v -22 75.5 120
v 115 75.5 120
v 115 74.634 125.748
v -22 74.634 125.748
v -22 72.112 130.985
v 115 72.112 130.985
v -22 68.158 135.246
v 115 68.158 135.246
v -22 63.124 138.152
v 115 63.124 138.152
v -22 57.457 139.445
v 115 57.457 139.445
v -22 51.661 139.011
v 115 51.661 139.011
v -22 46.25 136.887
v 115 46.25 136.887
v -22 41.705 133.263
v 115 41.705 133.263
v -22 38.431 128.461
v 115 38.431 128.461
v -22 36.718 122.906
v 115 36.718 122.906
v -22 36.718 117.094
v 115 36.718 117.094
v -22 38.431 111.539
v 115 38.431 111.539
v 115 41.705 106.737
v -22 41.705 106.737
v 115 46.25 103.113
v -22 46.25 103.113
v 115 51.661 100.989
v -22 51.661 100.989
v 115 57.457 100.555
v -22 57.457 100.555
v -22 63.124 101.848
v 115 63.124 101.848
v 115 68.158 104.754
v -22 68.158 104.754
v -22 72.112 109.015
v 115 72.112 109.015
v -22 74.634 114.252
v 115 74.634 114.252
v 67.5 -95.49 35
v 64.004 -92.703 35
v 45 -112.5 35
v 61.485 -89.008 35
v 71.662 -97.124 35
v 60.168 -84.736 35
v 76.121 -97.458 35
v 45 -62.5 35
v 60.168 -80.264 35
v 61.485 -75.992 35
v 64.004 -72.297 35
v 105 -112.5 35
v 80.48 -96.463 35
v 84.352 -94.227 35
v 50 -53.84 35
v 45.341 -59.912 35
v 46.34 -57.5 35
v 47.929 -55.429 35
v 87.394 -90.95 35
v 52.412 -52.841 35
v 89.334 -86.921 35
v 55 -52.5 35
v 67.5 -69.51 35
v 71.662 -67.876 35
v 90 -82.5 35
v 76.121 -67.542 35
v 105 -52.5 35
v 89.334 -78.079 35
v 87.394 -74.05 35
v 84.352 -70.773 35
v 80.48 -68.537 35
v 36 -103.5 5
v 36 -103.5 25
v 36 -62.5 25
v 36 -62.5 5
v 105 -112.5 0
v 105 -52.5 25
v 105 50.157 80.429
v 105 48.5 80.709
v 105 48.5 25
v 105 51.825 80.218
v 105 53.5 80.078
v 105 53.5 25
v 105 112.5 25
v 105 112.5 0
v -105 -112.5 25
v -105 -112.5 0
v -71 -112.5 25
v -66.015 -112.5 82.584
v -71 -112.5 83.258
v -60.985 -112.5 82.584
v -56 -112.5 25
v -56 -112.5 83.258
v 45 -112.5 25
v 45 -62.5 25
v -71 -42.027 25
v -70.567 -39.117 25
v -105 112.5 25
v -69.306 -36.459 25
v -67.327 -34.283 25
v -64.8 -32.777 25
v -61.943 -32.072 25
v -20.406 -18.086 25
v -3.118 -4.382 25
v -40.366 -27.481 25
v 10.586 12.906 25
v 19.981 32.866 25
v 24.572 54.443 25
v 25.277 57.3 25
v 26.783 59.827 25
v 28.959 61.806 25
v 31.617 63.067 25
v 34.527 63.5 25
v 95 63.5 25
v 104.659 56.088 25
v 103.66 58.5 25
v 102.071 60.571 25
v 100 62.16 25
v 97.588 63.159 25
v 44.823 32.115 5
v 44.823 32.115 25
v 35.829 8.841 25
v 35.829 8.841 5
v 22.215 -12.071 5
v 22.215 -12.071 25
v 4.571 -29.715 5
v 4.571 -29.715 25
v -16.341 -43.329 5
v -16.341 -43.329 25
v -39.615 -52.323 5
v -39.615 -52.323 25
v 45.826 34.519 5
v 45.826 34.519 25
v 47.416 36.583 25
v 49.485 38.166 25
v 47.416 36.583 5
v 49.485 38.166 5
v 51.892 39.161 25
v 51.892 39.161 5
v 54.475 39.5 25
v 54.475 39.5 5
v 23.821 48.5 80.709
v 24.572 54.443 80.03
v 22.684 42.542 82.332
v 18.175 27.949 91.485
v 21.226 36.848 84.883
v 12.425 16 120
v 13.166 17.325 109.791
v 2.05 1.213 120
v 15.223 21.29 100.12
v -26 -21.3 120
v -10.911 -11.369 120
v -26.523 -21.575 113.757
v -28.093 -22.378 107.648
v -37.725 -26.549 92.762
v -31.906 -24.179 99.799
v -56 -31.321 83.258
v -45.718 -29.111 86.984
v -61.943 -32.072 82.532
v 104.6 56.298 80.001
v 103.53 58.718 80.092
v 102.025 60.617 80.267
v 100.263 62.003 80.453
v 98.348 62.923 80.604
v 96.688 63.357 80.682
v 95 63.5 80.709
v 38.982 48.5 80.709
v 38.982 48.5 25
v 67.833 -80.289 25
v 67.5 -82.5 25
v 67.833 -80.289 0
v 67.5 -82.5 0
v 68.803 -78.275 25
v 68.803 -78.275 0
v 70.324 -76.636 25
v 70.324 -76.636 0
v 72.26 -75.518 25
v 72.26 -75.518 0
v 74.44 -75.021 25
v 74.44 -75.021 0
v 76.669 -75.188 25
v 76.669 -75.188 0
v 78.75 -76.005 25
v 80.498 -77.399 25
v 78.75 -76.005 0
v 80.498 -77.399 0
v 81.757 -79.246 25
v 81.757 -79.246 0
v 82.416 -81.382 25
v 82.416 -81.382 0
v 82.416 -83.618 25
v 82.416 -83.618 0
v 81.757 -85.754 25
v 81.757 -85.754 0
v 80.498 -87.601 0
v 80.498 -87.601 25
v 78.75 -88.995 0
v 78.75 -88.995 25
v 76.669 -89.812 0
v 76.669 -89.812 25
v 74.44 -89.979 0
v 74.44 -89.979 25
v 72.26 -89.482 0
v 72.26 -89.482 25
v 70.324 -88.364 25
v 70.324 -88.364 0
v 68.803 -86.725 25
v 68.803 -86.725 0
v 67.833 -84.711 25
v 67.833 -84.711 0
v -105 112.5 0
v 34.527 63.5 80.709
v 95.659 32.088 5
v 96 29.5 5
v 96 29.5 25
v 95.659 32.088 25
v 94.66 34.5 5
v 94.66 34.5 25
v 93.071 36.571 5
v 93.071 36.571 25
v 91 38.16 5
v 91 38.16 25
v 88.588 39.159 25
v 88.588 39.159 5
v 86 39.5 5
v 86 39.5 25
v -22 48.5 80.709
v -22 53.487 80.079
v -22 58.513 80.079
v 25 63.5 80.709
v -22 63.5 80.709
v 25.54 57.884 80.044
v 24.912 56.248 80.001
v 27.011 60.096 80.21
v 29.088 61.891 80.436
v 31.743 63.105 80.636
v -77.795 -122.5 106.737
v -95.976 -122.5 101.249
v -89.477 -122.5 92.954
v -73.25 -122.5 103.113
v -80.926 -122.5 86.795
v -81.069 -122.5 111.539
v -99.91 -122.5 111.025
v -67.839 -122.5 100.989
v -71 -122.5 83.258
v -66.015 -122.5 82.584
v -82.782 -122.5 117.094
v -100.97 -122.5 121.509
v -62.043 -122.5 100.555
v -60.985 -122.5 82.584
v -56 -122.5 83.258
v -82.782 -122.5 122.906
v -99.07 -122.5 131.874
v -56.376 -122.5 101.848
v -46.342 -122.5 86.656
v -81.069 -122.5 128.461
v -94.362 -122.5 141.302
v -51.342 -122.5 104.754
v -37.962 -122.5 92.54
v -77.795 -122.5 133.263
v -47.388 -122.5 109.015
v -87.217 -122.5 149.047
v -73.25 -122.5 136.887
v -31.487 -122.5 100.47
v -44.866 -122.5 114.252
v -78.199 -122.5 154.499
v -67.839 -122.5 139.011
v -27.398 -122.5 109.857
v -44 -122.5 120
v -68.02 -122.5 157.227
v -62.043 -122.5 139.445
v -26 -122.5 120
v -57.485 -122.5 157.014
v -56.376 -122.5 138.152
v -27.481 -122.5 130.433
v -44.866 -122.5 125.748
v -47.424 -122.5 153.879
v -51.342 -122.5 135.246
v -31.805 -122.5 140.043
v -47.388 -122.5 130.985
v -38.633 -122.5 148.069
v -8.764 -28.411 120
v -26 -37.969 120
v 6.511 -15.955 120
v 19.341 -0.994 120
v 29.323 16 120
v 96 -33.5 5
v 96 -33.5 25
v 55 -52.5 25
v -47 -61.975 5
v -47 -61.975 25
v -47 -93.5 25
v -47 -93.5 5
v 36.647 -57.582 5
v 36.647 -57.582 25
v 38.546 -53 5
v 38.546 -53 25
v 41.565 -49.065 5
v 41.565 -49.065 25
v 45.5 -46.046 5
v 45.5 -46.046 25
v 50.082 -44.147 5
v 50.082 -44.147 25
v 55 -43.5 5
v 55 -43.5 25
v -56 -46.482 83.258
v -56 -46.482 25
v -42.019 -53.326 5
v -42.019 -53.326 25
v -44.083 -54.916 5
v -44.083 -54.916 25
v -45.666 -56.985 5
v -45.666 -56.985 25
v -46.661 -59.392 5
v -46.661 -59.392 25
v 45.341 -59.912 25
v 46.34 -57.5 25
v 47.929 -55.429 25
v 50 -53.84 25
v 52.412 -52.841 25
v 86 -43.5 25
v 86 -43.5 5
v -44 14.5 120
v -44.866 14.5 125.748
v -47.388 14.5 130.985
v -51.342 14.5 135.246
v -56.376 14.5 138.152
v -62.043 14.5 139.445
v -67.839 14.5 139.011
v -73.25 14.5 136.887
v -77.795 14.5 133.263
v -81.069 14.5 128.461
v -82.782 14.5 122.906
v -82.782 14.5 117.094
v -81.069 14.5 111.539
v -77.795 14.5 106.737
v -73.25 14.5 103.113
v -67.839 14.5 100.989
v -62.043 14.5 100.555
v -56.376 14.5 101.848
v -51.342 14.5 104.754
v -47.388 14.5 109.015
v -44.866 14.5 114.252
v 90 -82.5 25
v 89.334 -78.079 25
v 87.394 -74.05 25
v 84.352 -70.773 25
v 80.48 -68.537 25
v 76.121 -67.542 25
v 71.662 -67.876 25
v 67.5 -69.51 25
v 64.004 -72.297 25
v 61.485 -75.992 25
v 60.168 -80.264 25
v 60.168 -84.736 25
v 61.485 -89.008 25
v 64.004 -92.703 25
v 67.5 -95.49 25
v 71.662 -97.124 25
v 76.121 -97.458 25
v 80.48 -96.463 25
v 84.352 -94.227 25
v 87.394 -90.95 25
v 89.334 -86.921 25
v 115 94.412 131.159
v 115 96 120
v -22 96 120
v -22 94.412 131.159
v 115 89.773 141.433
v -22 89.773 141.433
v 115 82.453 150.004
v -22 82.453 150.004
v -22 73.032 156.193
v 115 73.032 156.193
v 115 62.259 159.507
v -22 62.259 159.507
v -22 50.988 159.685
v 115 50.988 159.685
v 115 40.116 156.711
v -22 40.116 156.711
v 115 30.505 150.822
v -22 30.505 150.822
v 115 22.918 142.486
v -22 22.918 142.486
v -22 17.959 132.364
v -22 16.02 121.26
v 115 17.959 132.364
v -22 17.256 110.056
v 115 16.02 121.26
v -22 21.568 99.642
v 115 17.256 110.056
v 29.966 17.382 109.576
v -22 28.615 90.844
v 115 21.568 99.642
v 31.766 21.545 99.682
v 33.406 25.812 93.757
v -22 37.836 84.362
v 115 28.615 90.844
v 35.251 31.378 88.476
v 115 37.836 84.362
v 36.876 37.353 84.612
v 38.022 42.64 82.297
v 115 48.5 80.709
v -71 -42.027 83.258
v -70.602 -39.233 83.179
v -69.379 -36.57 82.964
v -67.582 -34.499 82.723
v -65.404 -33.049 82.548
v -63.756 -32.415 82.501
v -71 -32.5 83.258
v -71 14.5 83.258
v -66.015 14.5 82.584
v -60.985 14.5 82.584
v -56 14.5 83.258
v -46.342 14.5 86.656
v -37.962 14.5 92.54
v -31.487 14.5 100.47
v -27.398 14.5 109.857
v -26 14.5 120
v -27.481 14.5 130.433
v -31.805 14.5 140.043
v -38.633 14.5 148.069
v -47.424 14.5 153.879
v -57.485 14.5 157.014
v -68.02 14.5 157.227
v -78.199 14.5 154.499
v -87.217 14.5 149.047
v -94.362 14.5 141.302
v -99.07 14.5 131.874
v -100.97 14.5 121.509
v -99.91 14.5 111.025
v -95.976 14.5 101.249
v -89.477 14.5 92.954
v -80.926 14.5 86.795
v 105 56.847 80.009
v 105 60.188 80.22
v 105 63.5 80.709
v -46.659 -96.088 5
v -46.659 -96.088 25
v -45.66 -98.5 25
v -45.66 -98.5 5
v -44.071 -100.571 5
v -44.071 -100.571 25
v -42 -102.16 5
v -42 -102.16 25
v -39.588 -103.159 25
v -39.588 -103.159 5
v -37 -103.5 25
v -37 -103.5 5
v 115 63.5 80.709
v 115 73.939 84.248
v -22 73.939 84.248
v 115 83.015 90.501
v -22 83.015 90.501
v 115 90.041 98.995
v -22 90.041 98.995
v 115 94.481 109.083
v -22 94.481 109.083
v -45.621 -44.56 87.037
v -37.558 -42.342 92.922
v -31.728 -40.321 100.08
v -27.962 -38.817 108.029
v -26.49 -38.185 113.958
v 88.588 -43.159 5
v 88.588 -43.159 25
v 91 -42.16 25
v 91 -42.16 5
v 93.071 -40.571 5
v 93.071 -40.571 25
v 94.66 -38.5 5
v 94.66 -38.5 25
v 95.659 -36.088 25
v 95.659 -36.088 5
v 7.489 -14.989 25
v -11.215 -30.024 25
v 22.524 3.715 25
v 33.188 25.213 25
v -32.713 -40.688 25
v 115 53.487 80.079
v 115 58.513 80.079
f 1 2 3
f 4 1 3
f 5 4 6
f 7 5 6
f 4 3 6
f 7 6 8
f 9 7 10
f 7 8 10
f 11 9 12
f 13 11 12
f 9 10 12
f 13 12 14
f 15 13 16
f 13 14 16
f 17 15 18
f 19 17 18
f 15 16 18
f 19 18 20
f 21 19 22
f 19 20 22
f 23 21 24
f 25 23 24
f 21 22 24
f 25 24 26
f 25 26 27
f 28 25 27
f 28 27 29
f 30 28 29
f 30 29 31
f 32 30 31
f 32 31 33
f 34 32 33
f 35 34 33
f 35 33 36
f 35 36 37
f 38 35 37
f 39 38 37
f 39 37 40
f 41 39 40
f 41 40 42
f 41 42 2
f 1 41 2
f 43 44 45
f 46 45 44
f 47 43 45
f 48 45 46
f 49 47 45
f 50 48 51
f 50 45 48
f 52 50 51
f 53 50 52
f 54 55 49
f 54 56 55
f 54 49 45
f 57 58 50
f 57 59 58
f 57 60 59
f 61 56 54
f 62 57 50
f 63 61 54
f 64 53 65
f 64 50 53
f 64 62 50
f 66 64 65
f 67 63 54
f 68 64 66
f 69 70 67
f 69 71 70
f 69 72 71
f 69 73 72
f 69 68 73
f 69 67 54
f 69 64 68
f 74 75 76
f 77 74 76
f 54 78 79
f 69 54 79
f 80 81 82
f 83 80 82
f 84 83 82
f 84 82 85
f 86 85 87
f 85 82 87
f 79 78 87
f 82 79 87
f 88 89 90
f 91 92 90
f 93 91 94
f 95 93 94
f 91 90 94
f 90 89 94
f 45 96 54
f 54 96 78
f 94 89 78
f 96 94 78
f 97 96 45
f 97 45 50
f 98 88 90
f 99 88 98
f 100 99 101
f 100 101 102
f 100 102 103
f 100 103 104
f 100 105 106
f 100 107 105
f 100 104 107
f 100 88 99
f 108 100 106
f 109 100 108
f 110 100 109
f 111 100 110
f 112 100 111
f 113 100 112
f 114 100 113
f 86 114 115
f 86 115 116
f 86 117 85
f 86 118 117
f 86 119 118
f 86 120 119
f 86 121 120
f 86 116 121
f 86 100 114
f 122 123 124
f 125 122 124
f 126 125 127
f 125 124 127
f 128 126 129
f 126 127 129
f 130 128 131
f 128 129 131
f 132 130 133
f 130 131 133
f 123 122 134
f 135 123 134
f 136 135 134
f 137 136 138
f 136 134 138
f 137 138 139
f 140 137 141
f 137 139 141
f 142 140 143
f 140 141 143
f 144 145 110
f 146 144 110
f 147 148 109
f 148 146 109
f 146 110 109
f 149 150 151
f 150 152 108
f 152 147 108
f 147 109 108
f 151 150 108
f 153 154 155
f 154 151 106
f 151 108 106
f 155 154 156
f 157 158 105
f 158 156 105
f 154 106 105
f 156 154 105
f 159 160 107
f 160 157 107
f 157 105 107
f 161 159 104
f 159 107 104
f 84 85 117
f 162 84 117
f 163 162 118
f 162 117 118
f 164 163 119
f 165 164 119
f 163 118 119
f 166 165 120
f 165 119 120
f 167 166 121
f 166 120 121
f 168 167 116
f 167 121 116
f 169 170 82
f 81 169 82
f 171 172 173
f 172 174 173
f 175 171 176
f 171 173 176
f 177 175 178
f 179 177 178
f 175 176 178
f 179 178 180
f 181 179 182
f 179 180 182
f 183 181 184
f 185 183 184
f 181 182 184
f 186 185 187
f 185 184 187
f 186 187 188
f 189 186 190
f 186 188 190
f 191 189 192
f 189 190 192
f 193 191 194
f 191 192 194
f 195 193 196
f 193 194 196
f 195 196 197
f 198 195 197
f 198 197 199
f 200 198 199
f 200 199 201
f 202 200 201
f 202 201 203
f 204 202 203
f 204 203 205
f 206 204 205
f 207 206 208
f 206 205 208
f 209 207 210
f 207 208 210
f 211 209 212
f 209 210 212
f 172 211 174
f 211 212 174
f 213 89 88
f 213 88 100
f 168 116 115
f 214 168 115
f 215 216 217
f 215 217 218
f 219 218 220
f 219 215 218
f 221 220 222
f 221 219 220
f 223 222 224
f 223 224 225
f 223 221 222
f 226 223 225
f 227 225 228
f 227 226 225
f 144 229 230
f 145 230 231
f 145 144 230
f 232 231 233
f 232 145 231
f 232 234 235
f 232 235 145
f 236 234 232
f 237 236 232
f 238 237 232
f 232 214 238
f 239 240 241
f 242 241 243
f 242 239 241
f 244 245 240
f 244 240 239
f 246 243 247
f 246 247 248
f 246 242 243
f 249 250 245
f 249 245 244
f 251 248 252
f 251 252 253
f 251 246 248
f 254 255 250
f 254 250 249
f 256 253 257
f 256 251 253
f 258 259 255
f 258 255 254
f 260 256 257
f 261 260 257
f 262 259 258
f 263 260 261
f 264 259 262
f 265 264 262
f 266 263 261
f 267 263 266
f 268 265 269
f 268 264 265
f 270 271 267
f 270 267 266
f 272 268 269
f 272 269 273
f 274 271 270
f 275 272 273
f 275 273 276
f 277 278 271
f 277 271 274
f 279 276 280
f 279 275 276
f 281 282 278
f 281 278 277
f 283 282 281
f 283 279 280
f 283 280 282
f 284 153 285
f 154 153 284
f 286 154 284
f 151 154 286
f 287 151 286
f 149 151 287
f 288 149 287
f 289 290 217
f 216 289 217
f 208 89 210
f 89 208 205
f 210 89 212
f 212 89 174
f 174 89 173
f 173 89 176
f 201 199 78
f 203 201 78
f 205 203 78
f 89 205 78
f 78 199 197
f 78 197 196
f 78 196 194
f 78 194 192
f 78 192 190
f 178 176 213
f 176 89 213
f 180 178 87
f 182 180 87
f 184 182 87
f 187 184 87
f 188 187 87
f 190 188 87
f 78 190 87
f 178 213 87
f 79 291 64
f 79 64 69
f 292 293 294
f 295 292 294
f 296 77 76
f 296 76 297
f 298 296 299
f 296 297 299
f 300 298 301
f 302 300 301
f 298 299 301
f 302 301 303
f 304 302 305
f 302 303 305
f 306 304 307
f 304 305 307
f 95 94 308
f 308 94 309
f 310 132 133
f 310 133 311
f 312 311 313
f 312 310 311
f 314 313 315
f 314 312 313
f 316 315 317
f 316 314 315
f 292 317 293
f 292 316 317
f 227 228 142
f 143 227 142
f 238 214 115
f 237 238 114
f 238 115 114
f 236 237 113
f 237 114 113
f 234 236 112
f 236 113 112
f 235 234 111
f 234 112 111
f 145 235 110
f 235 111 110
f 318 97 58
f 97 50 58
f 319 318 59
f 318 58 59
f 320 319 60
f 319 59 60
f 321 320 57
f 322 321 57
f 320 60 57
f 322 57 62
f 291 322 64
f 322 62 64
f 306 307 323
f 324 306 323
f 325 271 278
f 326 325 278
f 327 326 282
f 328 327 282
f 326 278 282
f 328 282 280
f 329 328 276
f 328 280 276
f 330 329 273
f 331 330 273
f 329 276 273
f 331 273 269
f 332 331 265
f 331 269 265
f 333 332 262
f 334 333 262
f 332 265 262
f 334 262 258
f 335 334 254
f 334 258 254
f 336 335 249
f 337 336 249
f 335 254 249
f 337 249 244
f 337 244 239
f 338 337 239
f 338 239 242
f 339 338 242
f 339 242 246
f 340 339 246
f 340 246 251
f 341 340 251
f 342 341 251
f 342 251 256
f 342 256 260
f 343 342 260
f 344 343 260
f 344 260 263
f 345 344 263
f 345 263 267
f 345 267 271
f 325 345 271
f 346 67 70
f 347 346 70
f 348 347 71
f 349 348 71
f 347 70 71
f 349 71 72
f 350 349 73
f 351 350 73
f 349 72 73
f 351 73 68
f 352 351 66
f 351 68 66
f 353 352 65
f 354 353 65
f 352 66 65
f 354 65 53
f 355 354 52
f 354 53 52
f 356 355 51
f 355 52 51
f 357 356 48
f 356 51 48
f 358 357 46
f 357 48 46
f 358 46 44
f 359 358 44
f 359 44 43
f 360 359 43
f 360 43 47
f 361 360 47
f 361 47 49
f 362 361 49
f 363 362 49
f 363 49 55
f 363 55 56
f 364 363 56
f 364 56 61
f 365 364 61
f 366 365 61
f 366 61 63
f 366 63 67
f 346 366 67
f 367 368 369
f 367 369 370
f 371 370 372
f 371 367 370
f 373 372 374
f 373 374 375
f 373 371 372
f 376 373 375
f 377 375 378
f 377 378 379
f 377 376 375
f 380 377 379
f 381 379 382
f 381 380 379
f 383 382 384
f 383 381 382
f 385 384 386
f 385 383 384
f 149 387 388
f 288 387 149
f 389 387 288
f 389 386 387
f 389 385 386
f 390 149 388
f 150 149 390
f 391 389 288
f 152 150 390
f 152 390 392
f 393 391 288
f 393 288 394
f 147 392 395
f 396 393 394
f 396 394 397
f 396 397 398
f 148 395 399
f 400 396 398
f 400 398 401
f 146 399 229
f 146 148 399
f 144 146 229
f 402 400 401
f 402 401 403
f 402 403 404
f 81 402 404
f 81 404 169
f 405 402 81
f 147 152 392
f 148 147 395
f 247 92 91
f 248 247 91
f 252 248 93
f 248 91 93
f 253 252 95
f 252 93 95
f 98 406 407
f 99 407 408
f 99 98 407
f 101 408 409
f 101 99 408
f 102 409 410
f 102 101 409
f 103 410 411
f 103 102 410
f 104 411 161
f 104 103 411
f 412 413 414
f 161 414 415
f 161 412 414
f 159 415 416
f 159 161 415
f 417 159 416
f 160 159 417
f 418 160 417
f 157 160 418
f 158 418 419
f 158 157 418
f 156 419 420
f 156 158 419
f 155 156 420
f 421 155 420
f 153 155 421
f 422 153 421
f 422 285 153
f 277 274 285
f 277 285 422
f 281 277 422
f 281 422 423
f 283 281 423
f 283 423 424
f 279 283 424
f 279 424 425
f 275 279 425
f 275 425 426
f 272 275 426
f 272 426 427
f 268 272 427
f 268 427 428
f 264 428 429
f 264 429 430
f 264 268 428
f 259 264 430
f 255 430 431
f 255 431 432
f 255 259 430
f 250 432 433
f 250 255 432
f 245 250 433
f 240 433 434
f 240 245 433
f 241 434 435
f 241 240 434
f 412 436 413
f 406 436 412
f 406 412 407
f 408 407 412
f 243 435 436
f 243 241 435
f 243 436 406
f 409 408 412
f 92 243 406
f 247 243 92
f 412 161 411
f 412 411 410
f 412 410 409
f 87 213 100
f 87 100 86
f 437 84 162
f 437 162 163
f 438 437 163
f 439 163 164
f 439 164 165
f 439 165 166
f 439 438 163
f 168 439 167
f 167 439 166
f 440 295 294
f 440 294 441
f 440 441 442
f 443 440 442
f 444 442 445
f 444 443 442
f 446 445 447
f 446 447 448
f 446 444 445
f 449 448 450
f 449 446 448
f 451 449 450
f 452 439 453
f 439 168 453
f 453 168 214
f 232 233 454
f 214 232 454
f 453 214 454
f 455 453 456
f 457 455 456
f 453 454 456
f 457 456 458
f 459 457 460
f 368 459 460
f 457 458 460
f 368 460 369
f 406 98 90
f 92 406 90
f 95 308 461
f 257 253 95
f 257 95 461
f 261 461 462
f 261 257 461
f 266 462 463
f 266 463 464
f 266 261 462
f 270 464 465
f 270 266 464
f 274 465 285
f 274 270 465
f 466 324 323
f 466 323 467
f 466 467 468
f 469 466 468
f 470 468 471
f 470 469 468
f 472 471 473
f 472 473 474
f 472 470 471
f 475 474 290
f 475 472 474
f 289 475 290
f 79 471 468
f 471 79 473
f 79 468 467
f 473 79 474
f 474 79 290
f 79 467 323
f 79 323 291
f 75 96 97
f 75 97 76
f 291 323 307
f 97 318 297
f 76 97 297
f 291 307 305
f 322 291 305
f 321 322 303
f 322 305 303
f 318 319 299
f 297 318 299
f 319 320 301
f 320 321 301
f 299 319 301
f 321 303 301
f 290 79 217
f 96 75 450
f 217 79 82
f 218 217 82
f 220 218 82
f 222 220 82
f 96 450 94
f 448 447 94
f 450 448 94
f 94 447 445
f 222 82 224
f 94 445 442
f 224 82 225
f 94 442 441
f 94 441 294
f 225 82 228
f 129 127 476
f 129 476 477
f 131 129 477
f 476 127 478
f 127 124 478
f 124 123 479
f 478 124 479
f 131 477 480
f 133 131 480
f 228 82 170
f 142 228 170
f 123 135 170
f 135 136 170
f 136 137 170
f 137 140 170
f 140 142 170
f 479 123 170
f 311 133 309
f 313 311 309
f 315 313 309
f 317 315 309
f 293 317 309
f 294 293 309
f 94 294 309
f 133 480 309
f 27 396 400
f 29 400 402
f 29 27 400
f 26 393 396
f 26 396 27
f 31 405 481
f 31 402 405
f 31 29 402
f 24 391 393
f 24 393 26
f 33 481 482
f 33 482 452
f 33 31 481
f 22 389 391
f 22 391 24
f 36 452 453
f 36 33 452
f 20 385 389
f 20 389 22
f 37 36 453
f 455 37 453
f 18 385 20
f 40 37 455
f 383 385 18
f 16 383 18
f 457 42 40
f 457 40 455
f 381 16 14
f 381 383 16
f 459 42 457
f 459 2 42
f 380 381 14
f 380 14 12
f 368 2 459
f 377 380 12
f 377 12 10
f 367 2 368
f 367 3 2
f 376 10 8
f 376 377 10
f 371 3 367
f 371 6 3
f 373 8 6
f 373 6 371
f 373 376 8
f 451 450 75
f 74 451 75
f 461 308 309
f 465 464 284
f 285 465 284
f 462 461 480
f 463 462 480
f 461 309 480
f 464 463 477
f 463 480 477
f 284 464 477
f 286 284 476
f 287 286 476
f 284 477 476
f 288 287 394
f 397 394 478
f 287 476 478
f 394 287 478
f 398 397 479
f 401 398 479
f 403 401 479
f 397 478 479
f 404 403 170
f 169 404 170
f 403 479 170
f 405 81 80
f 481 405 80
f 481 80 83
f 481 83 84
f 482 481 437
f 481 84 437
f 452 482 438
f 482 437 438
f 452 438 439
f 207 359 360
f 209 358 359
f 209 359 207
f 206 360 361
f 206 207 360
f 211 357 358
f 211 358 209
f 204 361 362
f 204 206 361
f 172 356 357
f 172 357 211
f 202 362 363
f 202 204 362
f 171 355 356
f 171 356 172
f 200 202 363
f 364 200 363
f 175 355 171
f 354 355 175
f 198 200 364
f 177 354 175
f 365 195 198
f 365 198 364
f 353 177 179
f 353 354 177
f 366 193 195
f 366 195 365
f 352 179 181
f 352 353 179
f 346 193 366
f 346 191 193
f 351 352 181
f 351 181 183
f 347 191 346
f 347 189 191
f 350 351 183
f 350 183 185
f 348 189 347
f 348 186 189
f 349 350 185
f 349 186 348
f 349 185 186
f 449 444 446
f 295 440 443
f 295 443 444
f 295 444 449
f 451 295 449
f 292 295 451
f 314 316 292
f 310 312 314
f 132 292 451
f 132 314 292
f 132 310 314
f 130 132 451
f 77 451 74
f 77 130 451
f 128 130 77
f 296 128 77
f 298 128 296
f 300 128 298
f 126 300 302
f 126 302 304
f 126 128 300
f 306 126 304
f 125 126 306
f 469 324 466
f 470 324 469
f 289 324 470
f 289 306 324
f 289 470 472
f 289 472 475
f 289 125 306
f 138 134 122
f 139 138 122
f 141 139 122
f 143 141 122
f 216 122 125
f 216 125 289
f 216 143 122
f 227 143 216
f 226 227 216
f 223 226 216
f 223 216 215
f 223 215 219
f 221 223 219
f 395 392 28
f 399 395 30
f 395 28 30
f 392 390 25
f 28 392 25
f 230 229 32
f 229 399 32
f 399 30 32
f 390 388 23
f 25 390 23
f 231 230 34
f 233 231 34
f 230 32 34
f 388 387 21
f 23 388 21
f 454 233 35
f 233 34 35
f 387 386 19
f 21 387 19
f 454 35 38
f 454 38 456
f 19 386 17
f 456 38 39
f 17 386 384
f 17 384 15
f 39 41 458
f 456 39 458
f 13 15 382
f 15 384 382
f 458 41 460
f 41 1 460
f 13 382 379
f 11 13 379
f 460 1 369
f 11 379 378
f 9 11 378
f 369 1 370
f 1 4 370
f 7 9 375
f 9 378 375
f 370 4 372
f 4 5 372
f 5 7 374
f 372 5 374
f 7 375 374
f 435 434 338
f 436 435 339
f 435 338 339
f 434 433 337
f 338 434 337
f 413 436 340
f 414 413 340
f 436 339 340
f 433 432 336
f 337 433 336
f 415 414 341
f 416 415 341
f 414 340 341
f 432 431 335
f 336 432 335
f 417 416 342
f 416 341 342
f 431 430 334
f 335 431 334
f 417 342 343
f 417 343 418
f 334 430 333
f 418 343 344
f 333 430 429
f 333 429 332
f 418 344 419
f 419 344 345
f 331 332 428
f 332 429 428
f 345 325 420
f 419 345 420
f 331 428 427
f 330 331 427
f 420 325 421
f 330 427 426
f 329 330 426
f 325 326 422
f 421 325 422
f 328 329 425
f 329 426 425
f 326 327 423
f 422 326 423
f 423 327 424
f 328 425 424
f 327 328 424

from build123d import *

# Parameters (mm, degrees)
F0_W            = 210
F0_H            = 225
F1_DEPTH        = 25
F3_DEPTH        = 95
F5_DEPTH        = 10
F5_DEPTH_BACK   = 127
F7_DEPTH        = 10
F7_DEPTH_BACK   = 127
F8_W            = 60
F8_H            = 60
F9_DEPTH        = 10
F10_R           = 10
F12_DEPTH       = 20
F14_D           = 15
F14_CBORE_D     = 30
F14_CBORE_DEPTH = 10
F15_T1_DEPTH    = 20
F15_T6_DEPTH    = 80.7094158862
F15_S7_R        = 40
F15_T8_DEPTH    = 42
F15_T12_DEPTH   = 79.5275350517
F15_S13_R       = 40
F15_T14_DEPTH   = 42
F15_T18_DEPTH   = 82.0757730237
F15_S19_R       = 37.5
F15_T20_DEPTH   = 43
F16_R           = 19.5
F17_DEPTH       = 235.001
F18_R           = 19.5
F19_DEPTH       = 220.001


# Not quite as in the source:
# - a fillet or chamfer that OpenCascade refuses, or shapes differently, is made with other operations: its cross-section is extruded or revolved along the edge and cut away or added


with BuildPart() as f1:
    # F0 (on Top) → F1 (new body)
    with BuildSketch(Plane.XY):
        Rectangle(F0_W, F0_H)
    extrude(amount=F1_DEPTH)

    # F2 (on face) → F3 (join)
    with BuildSketch(Plane.XY.offset(25)):
        with BuildLine():
            Line((105, 48.5), (105, 63.5))
            Line((105, 63.5), (25, 63.5))
            ThreePointArc((25, 63.5), (-3.1177490061, -4.3822509939), (-71, -32.5))
            Line((-71, -32.5), (-71, -112.5))
            Line((-71, -112.5), (-56, -112.5))
            Line((-56, -112.5), (-56, -46.4818166789))
            ThreePointArc((-56, -46.4818166789), (7.4888527117, -14.9888527117), (38.9818166789, 48.5))
            Line((38.9818166789, 48.5), (105, 48.5))
        make_face()
    extrude(amount=F3_DEPTH)

    # F4 (on face) → F5 (join, two sides)
    with BuildSketch(Plane.XZ.offset(112.5)) as f5_sk:
        with BuildLine():
            ThreePointArc((-56, 83.2576538583), (-34.4526249034, 96.2829175487), (-26, 120))
            ThreePointArc((-26, 120), (-87.2170824513, 149.0473750966), (-71, 83.2576538583))
            Line((-71, 83.2576538583), (-71, 120))
            Line((-71, 120), (-56, 120))
            Line((-56, 120), (-56, 83.2576538583))
        make_face()
        with BuildLine():
            Line((-71, 120), (-71, 83.2576538583))
            ThreePointArc((-71, 83.2576538583), (-63.5, 82.5), (-56, 83.2576538583))
            Line((-56, 83.2576538583), (-56, 120))
            Line((-56, 120), (-71, 120))
        make_face()
    extrude(amount=F5_DEPTH)
    extrude(f5_sk.sketch, amount=-F5_DEPTH_BACK)

    # F6 (on face) → F7 (join, two sides)
    with BuildSketch(Plane.YZ.offset(105)) as f7_sk:
        with BuildLine():
            Line((48.5, 120), (48.5, 80.7094158862))
            ThreePointArc((48.5, 80.7094158862), (56, 80), (63.5, 80.7094158862))
            Line((63.5, 80.7094158862), (63.5, 120))
            Line((63.5, 120), (48.5, 120))
        make_face()
        with BuildLine():
            ThreePointArc((63.5, 80.7094158862), (86.8220700148, 94.504902432), (96, 120))
            ThreePointArc((96, 120), (30.504902432, 150.8220700148), (48.5, 80.7094158862))
            Line((48.5, 80.7094158862), (48.5, 120))
            Line((48.5, 120), (63.5, 120))
            Line((63.5, 120), (63.5, 80.7094158862))
        make_face()
    extrude(amount=F7_DEPTH)
    extrude(f7_sk.sketch, amount=-F7_DEPTH_BACK)

    # F8 (on face) → F9 (join)
    with BuildSketch(Plane.XY.offset(25)):
        with Locations((75, -82.5)):
            Rectangle(F8_W, F8_H)
    extrude(amount=F9_DEPTH)

    # F10
    f10_edges = [f1.edges().sort_by_distance(p)[0] for p in [
        (45, -52.5, 30),
    ]]
    fillet(f10_edges, radius=F10_R)

    # F11 (on face) → F12 (cut)
    with BuildSketch(Plane.XY.offset(25)):
        with BuildLine():
            ThreePointArc((46.5755076536, 39.5), (13.8528137424, -21.3528137424), (-47, -54.0755076536))
            Line((-47, -54.0755076536), (-47, -103.5))
            Line((-47, -103.5), (36, -103.5))
            Line((36, -103.5), (36, -62.5))
            ThreePointArc((36, -62.5), (41.5649711575, -49.0649711575), (55, -43.5))
            Line((55, -43.5), (96, -43.5))
            Line((96, -43.5), (96, 39.5))
            Line((96, 39.5), (46.5755076536, 39.5))
        make_face()
    extrude(amount=-F12_DEPTH, mode=Mode.SUBTRACT)

    # F14 (through all)
    with Locations(Plane.XY.offset(35)):
        with Locations((75, -82.5)):
            CounterBoreHole(F14_D / 2, F14_CBORE_D / 2, F14_CBORE_DEPTH)

    # F15: fillet of radius 10 on 8 edges, made by hand

    # F15_s2 → F15_t1 (join)
    with BuildSketch(Plane.XY.offset(5)):
        with BuildLine():
            ThreePointArc((-39.6153846154, -52.3231665823), (-44.9420981533, -55.8986609284), (-47, -61.9750971309))
            Line((-47, -61.9750971309), (-47, -54.0755076536))
            ThreePointArc((-47, -54.0755076536), (-43.2938349797, -53.257733876), (-39.6153846154, -52.3231665823))
        make_face()
        with BuildLine():
            ThreePointArc((44.8231665823, 32.1153846154), (48.3986609284, 37.4420981533), (54.4750971309, 39.5))
            Line((54.4750971309, 39.5), (46.5755076536, 39.5))
            ThreePointArc((46.5755076536, 39.5), (45.757733876, 35.7938349797), (44.8231665823, 32.1153846154))
        make_face()
        with BuildLine():
            ThreePointArc((96, 29.5), (93.0710678119, 36.5710678119), (86, 39.5))
            Line((86, 39.5), (96, 39.5))
            Line((96, 39.5), (96, 29.5))
        make_face()
        with BuildLine():
            ThreePointArc((86, -43.5), (93.0710678119, -40.5710678119), (96, -33.5))
            Line((96, -33.5), (96, -43.5))
            Line((96, -43.5), (86, -43.5))
        make_face()
        with BuildLine():
            ThreePointArc((-47, -93.5), (-44.0710678119, -100.5710678119), (-37, -103.5))
            Line((-37, -103.5), (-47, -103.5))
            Line((-47, -103.5), (-47, -93.5))
        make_face()
    extrude(amount=F15_T1_DEPTH)


with BuildPart() as f15_tool4:
    # F15_s5 → F15_t6 (new body)
    with BuildSketch(Plane.XY.offset(25)):
        with BuildLine():
            ThreePointArc((105, 53.5), (102.0710678119, 60.5710678119), (95, 63.5))
            Line((95, 63.5), (105, 63.5))
            Line((105, 63.5), (105, 53.5))
        make_face()
    extrude(amount=F15_T6_DEPTH)

    # F15_s7 → F15_t8 (cut, symmetric)
    with BuildSketch(Plane.YZ.offset(100)):
        with Locations((56, 120)):
            Circle(F15_S7_R)
    extrude(amount=F15_T8_DEPTH, both=True, mode=Mode.SUBTRACT)


with BuildPart() as f1_1:
    add(f1.part)

    # F15_t3: cut F15_tool4
    add(f15_tool4.part, mode=Mode.SUBTRACT)


with BuildPart() as f15_tool10:
    # F15_s11 → F15_t12 (new body)
    with BuildSketch(Plane.XY.offset(25)):
        with BuildLine():
            ThreePointArc((34.5272476662, 63.5), (27.7979818171, 60.8970927486), (24.571846943, 54.4433962264))
            ThreePointArc((24.571846943, 54.4433962264), (24.8929019962, 58.9666406785), (25, 63.5))
            Line((25, 63.5), (34.5272476662, 63.5))
        make_face()
    extrude(amount=F15_T12_DEPTH)

    # F15_s13 → F15_t14 (cut, symmetric)
    with BuildSketch(Plane.YZ.offset(29.5)):
        with Locations((56, 120)):
            Circle(F15_S13_R)
    extrude(amount=F15_T14_DEPTH, both=True, mode=Mode.SUBTRACT)


with BuildPart() as f1_2:
    add(f1_1.part)

    # F15_t9: cut F15_tool10
    add(f15_tool10.part, mode=Mode.SUBTRACT)


with BuildPart() as f15_tool16:
    # F15_s17 → F15_t18 (new body)
    with BuildSketch(Plane.XY.offset(25)):
        with BuildLine():
            ThreePointArc((-71, -42.0272476662), (-68.3970927486, -35.2979818171), (-61.9433962264, -32.071846943))
            ThreePointArc((-61.9433962264, -32.071846943), (-66.4666406785, -32.3929019962), (-71, -32.5))
            Line((-71, -32.5), (-71, -42.0272476662))
        make_face()
    extrude(amount=F15_T18_DEPTH)

    # F15_s19 → F15_t20 (cut, symmetric)
    with BuildSketch(Plane.XZ.offset(37)):
        with Locations((-63.5, 120)):
            Circle(F15_S19_R)
    extrude(amount=F15_T20_DEPTH, both=True, mode=Mode.SUBTRACT)


with BuildPart() as f1_3:
    add(f1_2.part)

    # F15_t15: cut F15_tool16
    add(f15_tool16.part, mode=Mode.SUBTRACT)

    # F16 (on face) → F17 (cut, through all)
    with BuildSketch(Plane.XZ.offset(122.5)):
        with Locations((-63.5, 120)):
            Circle(F16_R)
    extrude(amount=-F17_DEPTH, mode=Mode.SUBTRACT)

    # F18 (on face) → F19 (cut, through all)
    with BuildSketch(Plane.YZ.offset(115)):
        with Locations((56, 120)):
            Circle(F18_R)
    extrude(amount=-F19_DEPTH, mode=Mode.SUBTRACT)


solid = f1_3.part
